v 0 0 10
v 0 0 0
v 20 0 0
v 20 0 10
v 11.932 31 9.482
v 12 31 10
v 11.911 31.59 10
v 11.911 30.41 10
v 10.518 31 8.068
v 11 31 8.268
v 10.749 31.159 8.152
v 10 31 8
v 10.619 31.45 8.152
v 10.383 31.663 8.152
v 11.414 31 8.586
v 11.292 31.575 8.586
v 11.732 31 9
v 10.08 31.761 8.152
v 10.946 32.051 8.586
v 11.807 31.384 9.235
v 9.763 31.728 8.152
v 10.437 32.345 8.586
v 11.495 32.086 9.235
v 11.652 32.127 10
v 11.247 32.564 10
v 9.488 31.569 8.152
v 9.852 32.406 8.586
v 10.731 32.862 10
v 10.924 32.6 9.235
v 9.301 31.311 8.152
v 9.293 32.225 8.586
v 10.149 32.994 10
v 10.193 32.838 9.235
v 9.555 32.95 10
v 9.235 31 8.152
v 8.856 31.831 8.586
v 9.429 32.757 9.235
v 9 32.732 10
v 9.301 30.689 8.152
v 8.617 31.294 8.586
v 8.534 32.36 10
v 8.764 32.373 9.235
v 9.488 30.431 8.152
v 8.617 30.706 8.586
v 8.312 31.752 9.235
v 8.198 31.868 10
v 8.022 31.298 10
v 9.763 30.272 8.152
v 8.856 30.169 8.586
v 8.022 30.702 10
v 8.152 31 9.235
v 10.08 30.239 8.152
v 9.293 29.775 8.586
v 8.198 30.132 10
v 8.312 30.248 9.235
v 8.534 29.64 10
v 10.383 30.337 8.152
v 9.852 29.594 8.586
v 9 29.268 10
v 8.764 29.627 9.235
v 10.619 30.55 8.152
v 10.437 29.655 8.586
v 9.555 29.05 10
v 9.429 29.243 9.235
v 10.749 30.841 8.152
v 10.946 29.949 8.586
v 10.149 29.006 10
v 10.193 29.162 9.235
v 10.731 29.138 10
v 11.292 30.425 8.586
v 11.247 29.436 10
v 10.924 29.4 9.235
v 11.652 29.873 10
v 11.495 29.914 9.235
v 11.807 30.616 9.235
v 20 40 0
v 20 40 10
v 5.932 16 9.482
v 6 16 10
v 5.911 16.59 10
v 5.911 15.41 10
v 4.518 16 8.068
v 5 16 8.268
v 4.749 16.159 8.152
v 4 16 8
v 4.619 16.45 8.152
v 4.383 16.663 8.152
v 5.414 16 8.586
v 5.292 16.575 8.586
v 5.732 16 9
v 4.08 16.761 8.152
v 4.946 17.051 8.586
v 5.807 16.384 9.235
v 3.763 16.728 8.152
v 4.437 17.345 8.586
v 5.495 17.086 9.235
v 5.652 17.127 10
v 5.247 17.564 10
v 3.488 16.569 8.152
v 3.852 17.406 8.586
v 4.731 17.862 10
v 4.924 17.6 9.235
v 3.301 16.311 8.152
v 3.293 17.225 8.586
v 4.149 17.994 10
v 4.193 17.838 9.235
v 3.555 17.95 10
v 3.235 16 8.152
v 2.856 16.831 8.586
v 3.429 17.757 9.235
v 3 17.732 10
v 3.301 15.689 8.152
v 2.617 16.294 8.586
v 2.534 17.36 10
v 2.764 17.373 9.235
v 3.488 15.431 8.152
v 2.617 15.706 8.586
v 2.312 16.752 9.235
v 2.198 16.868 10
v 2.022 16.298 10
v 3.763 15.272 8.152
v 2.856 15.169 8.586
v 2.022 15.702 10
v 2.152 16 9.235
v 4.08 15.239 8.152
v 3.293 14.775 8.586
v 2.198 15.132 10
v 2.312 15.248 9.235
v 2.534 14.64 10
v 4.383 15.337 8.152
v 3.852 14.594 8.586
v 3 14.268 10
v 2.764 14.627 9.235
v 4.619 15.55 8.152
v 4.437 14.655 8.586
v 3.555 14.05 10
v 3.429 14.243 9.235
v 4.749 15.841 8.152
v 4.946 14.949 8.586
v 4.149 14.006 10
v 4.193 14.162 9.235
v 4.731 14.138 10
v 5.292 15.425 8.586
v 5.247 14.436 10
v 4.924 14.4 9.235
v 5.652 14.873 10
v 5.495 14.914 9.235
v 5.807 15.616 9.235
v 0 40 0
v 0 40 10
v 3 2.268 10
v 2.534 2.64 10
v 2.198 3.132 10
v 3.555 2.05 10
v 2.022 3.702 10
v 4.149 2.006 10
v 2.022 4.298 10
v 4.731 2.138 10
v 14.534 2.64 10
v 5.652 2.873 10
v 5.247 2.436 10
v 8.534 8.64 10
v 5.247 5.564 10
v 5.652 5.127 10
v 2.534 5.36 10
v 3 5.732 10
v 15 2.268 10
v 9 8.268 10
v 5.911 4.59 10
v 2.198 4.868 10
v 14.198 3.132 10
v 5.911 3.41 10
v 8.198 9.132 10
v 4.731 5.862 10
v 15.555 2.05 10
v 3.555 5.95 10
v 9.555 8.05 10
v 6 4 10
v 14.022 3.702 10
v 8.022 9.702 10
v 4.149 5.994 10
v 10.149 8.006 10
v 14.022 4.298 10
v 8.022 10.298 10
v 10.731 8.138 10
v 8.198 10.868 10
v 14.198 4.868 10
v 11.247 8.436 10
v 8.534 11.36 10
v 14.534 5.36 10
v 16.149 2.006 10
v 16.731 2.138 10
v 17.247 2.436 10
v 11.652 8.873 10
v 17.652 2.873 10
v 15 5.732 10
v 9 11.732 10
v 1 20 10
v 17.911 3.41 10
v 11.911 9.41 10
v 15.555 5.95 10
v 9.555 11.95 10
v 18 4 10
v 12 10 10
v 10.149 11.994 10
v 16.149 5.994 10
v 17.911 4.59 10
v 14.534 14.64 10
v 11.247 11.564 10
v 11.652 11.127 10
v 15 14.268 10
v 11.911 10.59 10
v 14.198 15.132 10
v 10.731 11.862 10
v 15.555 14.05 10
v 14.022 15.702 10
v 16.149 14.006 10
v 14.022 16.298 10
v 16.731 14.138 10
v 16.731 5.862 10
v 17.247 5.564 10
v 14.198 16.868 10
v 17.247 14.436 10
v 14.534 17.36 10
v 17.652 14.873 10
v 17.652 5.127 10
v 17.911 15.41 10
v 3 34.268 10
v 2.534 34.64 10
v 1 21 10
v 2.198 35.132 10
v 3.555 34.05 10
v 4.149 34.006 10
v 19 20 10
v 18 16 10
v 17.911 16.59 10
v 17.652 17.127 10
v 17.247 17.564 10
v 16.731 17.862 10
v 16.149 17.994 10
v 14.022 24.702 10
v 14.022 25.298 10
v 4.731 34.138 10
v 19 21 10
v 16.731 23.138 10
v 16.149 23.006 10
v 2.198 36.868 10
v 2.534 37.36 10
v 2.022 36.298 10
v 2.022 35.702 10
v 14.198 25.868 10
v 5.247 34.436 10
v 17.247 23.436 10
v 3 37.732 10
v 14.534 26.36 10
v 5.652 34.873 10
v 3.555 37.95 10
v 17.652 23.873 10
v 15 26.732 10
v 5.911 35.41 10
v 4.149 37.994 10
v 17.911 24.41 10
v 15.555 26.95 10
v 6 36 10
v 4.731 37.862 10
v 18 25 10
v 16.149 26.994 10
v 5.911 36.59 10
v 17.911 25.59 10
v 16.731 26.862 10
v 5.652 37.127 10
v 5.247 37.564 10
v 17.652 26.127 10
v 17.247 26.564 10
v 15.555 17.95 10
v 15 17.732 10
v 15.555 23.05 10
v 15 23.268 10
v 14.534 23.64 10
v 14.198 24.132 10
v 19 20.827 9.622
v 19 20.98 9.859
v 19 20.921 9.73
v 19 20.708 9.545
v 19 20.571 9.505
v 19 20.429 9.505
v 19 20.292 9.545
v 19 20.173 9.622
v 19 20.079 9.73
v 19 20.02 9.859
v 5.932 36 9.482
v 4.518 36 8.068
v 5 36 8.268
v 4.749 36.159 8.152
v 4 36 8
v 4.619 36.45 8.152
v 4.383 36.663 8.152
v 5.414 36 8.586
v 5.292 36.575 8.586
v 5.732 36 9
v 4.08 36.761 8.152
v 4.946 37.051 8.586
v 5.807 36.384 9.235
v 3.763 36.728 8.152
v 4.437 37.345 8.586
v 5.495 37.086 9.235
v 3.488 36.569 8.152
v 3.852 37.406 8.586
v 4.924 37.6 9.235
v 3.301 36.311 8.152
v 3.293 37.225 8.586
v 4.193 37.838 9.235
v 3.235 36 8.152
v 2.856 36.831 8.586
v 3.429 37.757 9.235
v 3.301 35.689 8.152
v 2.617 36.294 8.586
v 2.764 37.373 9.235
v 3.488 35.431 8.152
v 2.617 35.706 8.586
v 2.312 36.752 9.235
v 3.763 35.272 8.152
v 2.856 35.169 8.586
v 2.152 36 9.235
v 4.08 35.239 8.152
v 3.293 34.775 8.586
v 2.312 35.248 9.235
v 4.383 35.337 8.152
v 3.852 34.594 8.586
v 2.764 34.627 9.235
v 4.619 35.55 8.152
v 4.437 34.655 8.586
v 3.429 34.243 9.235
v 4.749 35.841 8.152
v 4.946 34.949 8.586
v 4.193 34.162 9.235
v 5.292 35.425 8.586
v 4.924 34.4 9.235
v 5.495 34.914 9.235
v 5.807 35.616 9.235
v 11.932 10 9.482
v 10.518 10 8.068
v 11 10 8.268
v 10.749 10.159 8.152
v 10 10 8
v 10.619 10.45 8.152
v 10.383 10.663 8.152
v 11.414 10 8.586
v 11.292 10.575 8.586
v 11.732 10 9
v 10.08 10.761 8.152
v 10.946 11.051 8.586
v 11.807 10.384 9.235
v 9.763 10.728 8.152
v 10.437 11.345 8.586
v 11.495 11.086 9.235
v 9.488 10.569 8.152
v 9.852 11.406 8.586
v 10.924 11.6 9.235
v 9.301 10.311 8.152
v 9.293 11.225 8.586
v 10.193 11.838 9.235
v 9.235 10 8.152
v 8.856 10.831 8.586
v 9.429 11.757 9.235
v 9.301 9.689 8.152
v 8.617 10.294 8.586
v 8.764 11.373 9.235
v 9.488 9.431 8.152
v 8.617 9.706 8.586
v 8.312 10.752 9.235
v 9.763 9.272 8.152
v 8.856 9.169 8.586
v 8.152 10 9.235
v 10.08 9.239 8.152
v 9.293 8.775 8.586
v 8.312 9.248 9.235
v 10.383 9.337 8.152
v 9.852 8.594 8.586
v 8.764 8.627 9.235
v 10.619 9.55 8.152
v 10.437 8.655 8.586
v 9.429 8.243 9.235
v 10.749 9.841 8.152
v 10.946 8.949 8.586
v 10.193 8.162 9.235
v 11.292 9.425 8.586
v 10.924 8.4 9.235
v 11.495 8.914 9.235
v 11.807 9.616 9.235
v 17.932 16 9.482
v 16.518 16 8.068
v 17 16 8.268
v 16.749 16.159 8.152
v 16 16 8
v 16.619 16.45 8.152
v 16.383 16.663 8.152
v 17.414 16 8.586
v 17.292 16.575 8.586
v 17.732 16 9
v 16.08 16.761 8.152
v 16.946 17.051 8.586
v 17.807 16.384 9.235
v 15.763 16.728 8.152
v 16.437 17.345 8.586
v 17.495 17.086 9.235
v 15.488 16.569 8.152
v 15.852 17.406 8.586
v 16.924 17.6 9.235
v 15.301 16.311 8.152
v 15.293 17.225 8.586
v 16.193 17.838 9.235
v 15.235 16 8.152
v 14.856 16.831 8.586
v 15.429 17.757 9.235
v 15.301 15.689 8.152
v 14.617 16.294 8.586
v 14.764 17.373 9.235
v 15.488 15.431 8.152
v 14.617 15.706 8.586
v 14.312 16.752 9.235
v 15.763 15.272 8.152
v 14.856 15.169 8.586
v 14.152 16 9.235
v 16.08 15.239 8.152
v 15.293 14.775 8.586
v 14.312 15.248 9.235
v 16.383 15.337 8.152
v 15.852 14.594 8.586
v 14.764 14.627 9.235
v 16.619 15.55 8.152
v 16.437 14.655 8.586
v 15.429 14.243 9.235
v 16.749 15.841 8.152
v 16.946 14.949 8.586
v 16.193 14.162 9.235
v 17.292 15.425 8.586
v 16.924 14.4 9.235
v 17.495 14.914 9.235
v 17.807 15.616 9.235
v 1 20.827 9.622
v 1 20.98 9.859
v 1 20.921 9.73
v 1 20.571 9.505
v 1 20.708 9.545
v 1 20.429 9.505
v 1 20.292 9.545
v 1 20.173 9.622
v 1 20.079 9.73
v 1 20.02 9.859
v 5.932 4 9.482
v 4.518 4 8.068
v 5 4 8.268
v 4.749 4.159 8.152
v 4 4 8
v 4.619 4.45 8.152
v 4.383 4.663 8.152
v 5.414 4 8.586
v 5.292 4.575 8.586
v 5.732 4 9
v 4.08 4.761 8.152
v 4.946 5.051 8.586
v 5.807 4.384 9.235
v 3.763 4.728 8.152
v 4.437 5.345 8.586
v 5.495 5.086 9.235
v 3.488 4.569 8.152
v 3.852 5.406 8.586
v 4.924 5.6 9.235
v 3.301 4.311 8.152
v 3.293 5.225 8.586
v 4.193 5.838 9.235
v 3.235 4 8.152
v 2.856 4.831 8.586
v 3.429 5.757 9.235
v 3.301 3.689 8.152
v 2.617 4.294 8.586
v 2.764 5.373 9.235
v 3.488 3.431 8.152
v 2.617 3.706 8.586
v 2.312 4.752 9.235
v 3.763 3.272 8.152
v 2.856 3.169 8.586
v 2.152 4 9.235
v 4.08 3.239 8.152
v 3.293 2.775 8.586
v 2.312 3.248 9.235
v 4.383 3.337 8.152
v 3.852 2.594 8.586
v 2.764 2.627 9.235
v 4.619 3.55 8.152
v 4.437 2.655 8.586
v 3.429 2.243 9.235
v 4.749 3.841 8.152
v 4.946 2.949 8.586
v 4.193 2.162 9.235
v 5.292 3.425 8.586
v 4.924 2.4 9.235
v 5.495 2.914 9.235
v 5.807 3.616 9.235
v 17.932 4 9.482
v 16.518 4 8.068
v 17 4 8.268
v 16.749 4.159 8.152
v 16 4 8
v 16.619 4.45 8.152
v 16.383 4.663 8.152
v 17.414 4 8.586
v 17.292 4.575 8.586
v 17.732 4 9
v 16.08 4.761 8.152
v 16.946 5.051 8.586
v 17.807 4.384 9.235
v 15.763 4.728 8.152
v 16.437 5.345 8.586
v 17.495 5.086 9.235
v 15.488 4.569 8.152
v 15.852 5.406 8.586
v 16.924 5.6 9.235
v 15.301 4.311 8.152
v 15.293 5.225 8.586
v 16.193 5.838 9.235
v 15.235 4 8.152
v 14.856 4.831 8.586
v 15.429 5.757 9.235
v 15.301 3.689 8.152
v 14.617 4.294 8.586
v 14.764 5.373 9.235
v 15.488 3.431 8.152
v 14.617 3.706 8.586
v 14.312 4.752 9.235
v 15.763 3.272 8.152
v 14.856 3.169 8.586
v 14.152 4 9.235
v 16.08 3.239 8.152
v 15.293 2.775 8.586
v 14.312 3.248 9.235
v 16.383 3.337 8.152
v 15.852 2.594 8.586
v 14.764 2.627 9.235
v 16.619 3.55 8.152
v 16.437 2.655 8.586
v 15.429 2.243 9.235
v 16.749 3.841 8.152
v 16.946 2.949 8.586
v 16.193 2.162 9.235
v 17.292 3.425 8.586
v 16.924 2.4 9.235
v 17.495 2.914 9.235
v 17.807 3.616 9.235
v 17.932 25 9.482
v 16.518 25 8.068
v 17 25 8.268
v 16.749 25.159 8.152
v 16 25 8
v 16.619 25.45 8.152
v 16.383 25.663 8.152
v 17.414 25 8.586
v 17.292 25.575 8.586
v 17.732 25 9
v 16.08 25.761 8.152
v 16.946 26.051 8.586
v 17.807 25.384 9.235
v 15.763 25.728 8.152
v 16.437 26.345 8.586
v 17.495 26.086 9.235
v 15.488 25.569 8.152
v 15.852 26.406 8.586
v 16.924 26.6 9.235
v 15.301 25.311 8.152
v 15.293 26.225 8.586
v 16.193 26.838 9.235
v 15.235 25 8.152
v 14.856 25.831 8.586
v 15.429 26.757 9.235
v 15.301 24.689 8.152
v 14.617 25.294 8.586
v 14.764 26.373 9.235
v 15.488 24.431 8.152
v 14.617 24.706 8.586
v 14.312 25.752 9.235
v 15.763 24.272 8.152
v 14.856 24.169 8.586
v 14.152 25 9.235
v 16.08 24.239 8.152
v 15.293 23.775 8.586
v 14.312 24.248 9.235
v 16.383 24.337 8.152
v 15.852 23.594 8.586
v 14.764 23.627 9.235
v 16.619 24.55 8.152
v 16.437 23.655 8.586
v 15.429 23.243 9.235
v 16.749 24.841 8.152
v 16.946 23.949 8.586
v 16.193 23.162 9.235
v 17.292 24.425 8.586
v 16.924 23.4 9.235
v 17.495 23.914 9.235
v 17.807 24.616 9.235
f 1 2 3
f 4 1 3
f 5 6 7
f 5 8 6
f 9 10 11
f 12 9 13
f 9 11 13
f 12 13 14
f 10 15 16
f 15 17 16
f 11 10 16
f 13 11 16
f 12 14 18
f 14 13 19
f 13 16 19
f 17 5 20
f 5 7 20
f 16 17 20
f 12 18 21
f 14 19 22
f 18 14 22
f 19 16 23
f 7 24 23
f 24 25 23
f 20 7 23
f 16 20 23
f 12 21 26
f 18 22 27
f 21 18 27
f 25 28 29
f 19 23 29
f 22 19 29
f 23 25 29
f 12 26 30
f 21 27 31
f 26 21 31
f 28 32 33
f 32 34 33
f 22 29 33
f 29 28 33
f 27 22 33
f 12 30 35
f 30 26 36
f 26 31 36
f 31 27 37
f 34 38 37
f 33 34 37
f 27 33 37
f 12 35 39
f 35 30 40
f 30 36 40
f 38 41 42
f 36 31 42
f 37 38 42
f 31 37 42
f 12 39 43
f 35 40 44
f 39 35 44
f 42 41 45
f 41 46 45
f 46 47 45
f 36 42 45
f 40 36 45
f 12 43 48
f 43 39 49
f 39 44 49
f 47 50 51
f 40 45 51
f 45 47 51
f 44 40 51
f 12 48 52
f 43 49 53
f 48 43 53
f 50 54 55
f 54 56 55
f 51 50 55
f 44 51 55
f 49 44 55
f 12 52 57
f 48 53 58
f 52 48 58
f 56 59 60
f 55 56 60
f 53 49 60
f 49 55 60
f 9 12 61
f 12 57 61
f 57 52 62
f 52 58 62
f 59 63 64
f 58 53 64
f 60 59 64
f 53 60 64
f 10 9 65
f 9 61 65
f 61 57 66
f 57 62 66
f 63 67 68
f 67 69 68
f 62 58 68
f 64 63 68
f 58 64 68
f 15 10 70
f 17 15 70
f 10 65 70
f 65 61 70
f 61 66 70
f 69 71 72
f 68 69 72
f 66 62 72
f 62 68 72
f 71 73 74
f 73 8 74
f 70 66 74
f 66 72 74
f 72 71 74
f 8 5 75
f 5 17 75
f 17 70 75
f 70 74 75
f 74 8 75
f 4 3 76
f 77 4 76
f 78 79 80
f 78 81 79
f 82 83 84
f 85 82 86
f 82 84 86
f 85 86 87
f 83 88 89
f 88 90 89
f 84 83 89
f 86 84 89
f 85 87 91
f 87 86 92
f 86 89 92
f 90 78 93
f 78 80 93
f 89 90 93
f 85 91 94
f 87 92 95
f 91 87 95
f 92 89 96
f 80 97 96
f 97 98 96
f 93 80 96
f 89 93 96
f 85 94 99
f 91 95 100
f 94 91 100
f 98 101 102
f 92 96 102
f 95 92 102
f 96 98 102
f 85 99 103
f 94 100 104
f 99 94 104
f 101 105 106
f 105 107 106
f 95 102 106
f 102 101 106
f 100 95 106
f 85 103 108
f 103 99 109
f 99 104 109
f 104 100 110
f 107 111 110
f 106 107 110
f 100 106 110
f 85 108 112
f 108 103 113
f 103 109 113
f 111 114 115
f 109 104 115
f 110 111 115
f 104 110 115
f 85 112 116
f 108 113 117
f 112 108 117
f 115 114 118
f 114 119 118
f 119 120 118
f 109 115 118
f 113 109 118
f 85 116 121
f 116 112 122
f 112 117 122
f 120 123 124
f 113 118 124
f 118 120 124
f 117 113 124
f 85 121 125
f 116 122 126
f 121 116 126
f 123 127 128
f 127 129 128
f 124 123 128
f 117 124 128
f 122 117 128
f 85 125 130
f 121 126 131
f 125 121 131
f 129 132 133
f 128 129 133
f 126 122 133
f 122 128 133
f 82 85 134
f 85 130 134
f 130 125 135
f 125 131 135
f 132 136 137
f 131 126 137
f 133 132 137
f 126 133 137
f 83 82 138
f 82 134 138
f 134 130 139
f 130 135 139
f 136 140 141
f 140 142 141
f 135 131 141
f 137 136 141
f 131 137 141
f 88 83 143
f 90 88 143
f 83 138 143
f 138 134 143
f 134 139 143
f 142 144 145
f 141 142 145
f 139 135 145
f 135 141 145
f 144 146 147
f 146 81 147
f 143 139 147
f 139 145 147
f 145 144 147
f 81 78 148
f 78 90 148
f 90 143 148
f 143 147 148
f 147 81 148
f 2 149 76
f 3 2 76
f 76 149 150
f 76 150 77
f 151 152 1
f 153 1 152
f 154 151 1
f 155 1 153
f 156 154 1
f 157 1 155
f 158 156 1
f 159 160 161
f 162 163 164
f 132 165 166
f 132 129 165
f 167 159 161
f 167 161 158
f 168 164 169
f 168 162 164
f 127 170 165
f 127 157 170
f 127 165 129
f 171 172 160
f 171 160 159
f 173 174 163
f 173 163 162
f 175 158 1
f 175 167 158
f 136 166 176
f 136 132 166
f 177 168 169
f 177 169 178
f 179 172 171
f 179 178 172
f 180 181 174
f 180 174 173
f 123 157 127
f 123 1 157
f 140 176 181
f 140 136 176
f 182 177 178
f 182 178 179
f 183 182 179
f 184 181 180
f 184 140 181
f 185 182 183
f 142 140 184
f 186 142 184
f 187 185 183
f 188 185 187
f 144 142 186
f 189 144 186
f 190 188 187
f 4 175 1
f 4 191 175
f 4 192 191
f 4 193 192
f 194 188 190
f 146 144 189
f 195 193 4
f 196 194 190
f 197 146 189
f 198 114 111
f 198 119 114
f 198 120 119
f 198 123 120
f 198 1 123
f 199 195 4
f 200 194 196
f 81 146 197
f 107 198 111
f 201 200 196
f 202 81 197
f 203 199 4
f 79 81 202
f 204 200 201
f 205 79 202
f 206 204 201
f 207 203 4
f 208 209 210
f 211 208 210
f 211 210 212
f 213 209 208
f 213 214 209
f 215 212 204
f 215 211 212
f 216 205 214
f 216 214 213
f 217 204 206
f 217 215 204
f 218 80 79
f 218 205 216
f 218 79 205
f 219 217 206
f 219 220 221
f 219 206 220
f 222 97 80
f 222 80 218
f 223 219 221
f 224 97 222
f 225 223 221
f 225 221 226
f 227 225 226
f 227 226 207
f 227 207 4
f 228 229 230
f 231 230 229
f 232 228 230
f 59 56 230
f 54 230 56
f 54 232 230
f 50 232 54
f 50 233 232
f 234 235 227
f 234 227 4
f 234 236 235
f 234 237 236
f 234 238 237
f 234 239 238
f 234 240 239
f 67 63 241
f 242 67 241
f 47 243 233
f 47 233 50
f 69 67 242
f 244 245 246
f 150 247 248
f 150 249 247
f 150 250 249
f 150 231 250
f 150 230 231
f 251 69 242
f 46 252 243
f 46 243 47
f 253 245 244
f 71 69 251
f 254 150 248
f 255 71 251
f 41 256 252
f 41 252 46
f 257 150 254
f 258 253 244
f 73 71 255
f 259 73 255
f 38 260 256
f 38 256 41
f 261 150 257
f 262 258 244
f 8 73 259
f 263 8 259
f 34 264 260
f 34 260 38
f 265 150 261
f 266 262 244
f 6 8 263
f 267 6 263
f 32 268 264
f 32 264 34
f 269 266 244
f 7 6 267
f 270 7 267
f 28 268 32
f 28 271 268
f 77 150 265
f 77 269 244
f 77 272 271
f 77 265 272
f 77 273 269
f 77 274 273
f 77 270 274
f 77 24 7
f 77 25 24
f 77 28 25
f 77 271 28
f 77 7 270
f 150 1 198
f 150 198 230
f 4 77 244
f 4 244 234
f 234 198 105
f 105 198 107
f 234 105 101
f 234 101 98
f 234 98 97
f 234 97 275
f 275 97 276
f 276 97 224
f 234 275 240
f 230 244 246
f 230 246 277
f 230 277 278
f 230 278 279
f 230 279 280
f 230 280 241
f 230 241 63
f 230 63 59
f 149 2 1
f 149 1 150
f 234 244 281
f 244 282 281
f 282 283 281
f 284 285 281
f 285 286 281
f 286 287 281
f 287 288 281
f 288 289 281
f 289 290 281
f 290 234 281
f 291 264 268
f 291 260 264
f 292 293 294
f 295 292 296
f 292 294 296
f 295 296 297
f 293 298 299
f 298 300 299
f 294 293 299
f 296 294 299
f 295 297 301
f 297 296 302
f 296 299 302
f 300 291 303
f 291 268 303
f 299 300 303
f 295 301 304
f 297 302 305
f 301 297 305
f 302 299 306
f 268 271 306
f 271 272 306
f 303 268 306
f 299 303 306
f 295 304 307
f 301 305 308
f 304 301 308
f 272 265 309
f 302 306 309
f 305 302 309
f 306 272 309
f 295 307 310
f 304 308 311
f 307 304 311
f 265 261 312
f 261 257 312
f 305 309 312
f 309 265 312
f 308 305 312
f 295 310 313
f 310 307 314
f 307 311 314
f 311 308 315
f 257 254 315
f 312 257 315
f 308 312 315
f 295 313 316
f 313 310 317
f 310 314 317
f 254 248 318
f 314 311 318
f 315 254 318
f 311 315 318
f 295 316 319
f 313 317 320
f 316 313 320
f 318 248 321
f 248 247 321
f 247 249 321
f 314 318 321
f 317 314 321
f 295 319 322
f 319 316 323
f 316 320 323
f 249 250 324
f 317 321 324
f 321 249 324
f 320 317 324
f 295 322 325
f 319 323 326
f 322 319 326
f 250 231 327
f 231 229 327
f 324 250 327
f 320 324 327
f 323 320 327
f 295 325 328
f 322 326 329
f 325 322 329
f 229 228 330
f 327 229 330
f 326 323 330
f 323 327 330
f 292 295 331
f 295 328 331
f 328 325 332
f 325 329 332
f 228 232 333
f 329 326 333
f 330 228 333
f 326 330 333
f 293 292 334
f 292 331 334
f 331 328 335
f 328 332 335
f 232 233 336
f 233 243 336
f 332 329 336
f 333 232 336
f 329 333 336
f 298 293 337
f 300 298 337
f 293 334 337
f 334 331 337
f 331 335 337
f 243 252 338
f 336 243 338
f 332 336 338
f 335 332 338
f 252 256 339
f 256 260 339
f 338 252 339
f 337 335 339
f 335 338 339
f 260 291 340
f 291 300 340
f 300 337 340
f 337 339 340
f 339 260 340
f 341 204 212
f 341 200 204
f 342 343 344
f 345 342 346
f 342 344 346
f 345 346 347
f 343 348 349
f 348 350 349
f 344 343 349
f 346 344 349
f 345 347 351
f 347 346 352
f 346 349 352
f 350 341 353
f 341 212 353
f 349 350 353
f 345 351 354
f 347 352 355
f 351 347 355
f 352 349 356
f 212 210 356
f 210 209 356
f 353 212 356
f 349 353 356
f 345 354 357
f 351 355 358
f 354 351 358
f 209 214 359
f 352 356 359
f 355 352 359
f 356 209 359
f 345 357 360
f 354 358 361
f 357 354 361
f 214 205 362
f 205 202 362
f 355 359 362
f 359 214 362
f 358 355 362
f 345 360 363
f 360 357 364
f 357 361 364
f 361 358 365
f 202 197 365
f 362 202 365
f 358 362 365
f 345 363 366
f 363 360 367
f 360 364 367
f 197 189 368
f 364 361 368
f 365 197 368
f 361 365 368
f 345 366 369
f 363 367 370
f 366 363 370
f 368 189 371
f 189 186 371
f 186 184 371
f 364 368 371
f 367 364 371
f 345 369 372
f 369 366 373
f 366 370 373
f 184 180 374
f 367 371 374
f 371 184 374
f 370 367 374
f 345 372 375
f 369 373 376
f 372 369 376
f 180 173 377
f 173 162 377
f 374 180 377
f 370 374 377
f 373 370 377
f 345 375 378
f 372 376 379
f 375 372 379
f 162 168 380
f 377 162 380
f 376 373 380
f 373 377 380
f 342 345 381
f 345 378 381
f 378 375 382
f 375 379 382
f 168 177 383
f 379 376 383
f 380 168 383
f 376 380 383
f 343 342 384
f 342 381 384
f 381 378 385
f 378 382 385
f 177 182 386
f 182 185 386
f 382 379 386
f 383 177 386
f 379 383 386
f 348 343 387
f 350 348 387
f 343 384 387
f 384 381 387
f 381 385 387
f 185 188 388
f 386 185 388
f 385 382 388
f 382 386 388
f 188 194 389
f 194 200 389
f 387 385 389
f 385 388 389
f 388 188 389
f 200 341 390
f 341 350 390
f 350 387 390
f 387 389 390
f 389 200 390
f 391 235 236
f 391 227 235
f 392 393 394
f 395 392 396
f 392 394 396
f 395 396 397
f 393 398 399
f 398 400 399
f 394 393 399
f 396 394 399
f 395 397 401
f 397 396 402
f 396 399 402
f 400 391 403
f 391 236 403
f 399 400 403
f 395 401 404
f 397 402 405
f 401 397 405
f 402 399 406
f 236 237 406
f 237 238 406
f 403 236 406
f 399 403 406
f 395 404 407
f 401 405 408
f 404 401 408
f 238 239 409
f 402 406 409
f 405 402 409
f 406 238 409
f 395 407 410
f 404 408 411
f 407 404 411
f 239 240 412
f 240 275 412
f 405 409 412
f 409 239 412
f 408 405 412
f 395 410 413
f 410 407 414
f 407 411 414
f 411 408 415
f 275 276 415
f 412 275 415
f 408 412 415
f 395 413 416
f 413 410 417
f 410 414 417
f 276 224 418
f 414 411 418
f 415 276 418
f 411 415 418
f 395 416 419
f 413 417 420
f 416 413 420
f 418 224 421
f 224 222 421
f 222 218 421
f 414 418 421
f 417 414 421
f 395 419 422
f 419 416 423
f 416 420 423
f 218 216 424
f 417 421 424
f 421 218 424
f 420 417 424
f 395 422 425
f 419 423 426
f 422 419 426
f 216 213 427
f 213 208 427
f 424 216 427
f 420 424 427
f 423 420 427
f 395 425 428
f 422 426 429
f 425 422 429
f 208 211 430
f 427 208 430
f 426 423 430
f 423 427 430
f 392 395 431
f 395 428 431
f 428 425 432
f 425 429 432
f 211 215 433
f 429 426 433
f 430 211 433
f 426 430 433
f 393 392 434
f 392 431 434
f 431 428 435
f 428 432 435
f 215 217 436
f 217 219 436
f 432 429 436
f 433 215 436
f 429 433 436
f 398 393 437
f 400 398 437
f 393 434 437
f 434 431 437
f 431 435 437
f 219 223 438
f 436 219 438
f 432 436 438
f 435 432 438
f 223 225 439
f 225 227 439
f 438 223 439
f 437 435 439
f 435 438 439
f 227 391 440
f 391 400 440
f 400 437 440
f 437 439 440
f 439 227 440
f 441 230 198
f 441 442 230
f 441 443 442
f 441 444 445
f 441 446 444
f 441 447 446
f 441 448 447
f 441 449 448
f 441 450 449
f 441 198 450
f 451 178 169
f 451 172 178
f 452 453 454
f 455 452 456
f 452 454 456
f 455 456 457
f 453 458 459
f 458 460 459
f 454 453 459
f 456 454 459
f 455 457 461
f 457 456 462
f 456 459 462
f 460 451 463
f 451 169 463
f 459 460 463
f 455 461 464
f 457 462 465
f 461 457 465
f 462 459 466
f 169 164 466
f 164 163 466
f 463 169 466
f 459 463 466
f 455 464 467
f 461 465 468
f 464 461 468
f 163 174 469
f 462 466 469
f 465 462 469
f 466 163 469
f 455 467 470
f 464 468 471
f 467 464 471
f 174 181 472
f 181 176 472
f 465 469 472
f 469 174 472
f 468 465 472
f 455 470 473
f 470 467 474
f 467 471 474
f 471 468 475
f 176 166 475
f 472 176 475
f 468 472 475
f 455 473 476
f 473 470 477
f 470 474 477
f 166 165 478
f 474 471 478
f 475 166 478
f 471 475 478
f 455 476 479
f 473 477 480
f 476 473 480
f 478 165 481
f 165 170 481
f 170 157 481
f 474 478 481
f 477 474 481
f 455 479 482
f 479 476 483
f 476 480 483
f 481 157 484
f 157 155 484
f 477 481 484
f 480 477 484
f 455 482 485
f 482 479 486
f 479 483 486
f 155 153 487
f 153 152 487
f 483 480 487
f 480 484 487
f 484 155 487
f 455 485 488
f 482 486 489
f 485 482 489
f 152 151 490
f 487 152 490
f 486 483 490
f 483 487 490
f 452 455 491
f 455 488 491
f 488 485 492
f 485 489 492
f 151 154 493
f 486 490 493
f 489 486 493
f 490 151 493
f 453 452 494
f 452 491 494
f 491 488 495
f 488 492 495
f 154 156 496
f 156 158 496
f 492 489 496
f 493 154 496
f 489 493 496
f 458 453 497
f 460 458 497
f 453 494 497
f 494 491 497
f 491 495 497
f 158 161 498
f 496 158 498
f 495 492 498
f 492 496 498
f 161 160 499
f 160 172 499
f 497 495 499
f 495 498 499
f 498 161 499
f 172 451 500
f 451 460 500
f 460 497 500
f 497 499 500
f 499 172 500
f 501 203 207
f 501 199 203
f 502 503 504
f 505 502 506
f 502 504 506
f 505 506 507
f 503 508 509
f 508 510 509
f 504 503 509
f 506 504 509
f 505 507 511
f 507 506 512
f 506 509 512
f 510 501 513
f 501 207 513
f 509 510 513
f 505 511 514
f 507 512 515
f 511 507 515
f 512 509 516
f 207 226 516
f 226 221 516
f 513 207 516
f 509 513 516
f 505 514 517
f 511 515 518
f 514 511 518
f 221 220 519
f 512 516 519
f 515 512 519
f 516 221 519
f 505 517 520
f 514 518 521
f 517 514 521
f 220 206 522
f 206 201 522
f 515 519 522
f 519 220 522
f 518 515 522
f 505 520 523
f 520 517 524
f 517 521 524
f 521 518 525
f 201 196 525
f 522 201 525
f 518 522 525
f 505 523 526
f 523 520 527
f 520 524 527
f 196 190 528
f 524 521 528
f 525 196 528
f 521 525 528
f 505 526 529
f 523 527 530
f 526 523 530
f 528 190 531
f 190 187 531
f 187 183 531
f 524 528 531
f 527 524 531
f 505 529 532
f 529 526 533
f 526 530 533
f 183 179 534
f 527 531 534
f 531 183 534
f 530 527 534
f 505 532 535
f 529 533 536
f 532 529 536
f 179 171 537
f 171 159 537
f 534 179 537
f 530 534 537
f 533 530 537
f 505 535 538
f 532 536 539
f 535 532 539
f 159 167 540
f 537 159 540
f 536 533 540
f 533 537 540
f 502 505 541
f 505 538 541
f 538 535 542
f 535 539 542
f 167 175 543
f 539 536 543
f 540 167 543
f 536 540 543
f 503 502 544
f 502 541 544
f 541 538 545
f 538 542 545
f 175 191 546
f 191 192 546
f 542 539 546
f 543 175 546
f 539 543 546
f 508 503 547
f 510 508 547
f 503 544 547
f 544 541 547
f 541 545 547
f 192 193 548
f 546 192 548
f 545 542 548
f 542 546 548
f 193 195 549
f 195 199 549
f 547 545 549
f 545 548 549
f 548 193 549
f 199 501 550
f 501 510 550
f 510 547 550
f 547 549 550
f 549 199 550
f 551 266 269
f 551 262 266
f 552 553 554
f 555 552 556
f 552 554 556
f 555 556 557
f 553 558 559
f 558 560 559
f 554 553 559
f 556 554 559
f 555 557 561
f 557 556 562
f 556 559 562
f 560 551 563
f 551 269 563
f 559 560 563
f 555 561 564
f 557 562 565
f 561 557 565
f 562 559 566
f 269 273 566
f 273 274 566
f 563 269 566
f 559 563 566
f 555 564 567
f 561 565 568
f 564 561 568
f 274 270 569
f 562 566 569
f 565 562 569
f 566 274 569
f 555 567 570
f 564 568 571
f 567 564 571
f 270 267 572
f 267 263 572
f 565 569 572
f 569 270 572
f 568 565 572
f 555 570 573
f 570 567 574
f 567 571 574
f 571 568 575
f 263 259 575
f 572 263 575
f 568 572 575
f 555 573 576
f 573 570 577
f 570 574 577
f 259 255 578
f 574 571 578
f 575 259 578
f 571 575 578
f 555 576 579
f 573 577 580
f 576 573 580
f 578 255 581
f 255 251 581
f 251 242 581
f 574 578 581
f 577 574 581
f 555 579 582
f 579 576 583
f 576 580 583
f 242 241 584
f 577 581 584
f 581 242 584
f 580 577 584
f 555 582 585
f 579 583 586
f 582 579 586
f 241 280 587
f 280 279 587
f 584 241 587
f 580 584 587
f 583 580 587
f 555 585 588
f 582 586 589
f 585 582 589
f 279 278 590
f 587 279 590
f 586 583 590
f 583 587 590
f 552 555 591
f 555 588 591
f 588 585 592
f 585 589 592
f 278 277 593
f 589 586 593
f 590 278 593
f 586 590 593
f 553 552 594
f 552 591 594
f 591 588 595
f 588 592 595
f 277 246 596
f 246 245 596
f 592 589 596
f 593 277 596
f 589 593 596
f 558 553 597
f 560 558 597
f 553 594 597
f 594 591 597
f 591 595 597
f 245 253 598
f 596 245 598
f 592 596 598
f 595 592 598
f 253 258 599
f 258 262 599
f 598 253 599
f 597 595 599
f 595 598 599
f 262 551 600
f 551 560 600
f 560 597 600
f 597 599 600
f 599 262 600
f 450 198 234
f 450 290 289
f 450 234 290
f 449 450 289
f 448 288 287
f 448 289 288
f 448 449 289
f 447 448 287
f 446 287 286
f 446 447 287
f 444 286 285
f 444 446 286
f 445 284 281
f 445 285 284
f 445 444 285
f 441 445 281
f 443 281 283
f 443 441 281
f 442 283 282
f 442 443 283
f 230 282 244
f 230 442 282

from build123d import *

# Parameters (mm, degrees)
CYLINDER_R     = 0.5
CYLINDER_DEPTH = 18
BOX_W          = 20
BOX_H          = 40
BOX_DEPTH      = 10


with BuildPart() as sphere007:
    # Sphere007 → Sphere007 (revolve)
    with BuildSketch(Plane(origin=(16, 25, 10), x_dir=(1, 0, 0), z_dir=(0, -1, 0))):
        with BuildLine():
            ThreePointArc((0, -2), (2, 0), (0, 2))
            Line((0, 2), (0, -2))
        make_face()
    revolve(axis=Axis((16, 25, 10), (0, 0, 1)))


with BuildPart() as sphere006:
    # Sphere006 → Sphere006 (revolve)
    with BuildSketch(Plane(origin=(4, 36, 10), x_dir=(1, 0, 0), z_dir=(0, -1, 0))):
        with BuildLine():
            ThreePointArc((0, -2), (2, 0), (0, 2))
            Line((0, 2), (0, -2))
        make_face()
    revolve(axis=Axis((4, 36, 10), (0, 0, 1)))


with BuildPart() as sphere005:
    # Sphere005 → Sphere005 (revolve)
    with BuildSketch(Plane(origin=(10, 31, 10), x_dir=(1, 0, 0), z_dir=(0, -1, 0))):
        with BuildLine():
            ThreePointArc((0, -2), (2, 0), (0, 2))
            Line((0, 2), (0, -2))
        make_face()
    revolve(axis=Axis((10, 31, 10), (0, 0, 1)))


with BuildPart() as fusion:
    # Fusion base: copy of Sphere005
    add(sphere005.part)

    # Fusion: union Sphere007, Sphere006
    add(sphere007.part)
    add(sphere006.part)


with BuildPart() as sphere002:
    # Sphere002 → Sphere002 (revolve)
    with BuildSketch(Plane(origin=(4, 16, 10), x_dir=(1, 0, 0), z_dir=(0, -1, 0))):
        with BuildLine():
            ThreePointArc((0, -2), (2, 0), (0, 2))
            Line((0, 2), (0, -2))
        make_face()
    revolve(axis=Axis((4, 16, 10), (0, 0, 1)))


with BuildPart() as sphere003:
    # Sphere003 → Sphere003 (revolve)
    with BuildSketch(Plane(origin=(16, 16, 10), x_dir=(1, 0, 0), z_dir=(0, -1, 0))):
        with BuildLine():
            ThreePointArc((0, -2), (2, 0), (0, 2))
            Line((0, 2), (0, -2))
        make_face()
    revolve(axis=Axis((16, 16, 10), (0, 0, 1)))


with BuildPart() as sphere004:
    # Sphere004 → Sphere004 (revolve)
    with BuildSketch(Plane(origin=(10, 10, 10), x_dir=(1, 0, 0), z_dir=(0, -1, 0))):
        with BuildLine():
            ThreePointArc((0, -2), (2, 0), (0, 2))
            Line((0, 2), (0, -2))
        make_face()
    revolve(axis=Axis((10, 10, 10), (0, 0, 1)))


with BuildPart() as sphere:
    # Sphere → Sphere (revolve)
    with BuildSketch(Plane(origin=(4, 4, 10), x_dir=(1, 0, 0), z_dir=(0, -1, 0))):
        with BuildLine():
            ThreePointArc((0, -2), (2, 0), (0, 2))
            Line((0, 2), (0, -2))
        make_face()
    revolve(axis=Axis((4, 4, 10), (0, 0, 1)))


with BuildPart() as sphere001:
    # Sphere001 → Sphere001 (revolve)
    with BuildSketch(Plane(origin=(16, 4, 10), x_dir=(1, 0, 0), z_dir=(0, -1, 0))):
        with BuildLine():
            ThreePointArc((0, -2), (2, 0), (0, 2))
            Line((0, 2), (0, -2))
        make_face()
    revolve(axis=Axis((16, 4, 10), (0, 0, 1)))


with BuildPart() as fusion001:
    # Fusion001 base: copy of Sphere005
    add(sphere005.part)

    # Fusion001: union Sphere007, Sphere006, Sphere002, Sphere003, Sphere004, Sphere, Sphere001
    add(sphere007.part)
    add(sphere006.part)
    add(sphere002.part)
    add(sphere003.part)
    add(sphere004.part)
    add(sphere.part)
    add(sphere001.part)


with BuildPart() as fusion002:
    # Cylinder → Cylinder (new body)
    with BuildSketch(Plane(origin=(1, 20.5, 10), x_dir=(0, 0, -1), z_dir=(1, 0, 0))):
        Circle(CYLINDER_R)
    extrude(amount=CYLINDER_DEPTH)

    # Fusion002: union Fusion, Fusion001
    add(fusion.part)
    add(fusion001.part)


with BuildPart() as fitxa_domino:
    # Box → Box (new body)
    with BuildSketch(Plane.XY):
        with Locations((10, 20)):
            Rectangle(BOX_W, BOX_H)
    extrude(amount=BOX_DEPTH)

    # Cut: cut Fusion002
    add(fusion002.part, mode=Mode.SUBTRACT)


solid = fitxa_domino.part
